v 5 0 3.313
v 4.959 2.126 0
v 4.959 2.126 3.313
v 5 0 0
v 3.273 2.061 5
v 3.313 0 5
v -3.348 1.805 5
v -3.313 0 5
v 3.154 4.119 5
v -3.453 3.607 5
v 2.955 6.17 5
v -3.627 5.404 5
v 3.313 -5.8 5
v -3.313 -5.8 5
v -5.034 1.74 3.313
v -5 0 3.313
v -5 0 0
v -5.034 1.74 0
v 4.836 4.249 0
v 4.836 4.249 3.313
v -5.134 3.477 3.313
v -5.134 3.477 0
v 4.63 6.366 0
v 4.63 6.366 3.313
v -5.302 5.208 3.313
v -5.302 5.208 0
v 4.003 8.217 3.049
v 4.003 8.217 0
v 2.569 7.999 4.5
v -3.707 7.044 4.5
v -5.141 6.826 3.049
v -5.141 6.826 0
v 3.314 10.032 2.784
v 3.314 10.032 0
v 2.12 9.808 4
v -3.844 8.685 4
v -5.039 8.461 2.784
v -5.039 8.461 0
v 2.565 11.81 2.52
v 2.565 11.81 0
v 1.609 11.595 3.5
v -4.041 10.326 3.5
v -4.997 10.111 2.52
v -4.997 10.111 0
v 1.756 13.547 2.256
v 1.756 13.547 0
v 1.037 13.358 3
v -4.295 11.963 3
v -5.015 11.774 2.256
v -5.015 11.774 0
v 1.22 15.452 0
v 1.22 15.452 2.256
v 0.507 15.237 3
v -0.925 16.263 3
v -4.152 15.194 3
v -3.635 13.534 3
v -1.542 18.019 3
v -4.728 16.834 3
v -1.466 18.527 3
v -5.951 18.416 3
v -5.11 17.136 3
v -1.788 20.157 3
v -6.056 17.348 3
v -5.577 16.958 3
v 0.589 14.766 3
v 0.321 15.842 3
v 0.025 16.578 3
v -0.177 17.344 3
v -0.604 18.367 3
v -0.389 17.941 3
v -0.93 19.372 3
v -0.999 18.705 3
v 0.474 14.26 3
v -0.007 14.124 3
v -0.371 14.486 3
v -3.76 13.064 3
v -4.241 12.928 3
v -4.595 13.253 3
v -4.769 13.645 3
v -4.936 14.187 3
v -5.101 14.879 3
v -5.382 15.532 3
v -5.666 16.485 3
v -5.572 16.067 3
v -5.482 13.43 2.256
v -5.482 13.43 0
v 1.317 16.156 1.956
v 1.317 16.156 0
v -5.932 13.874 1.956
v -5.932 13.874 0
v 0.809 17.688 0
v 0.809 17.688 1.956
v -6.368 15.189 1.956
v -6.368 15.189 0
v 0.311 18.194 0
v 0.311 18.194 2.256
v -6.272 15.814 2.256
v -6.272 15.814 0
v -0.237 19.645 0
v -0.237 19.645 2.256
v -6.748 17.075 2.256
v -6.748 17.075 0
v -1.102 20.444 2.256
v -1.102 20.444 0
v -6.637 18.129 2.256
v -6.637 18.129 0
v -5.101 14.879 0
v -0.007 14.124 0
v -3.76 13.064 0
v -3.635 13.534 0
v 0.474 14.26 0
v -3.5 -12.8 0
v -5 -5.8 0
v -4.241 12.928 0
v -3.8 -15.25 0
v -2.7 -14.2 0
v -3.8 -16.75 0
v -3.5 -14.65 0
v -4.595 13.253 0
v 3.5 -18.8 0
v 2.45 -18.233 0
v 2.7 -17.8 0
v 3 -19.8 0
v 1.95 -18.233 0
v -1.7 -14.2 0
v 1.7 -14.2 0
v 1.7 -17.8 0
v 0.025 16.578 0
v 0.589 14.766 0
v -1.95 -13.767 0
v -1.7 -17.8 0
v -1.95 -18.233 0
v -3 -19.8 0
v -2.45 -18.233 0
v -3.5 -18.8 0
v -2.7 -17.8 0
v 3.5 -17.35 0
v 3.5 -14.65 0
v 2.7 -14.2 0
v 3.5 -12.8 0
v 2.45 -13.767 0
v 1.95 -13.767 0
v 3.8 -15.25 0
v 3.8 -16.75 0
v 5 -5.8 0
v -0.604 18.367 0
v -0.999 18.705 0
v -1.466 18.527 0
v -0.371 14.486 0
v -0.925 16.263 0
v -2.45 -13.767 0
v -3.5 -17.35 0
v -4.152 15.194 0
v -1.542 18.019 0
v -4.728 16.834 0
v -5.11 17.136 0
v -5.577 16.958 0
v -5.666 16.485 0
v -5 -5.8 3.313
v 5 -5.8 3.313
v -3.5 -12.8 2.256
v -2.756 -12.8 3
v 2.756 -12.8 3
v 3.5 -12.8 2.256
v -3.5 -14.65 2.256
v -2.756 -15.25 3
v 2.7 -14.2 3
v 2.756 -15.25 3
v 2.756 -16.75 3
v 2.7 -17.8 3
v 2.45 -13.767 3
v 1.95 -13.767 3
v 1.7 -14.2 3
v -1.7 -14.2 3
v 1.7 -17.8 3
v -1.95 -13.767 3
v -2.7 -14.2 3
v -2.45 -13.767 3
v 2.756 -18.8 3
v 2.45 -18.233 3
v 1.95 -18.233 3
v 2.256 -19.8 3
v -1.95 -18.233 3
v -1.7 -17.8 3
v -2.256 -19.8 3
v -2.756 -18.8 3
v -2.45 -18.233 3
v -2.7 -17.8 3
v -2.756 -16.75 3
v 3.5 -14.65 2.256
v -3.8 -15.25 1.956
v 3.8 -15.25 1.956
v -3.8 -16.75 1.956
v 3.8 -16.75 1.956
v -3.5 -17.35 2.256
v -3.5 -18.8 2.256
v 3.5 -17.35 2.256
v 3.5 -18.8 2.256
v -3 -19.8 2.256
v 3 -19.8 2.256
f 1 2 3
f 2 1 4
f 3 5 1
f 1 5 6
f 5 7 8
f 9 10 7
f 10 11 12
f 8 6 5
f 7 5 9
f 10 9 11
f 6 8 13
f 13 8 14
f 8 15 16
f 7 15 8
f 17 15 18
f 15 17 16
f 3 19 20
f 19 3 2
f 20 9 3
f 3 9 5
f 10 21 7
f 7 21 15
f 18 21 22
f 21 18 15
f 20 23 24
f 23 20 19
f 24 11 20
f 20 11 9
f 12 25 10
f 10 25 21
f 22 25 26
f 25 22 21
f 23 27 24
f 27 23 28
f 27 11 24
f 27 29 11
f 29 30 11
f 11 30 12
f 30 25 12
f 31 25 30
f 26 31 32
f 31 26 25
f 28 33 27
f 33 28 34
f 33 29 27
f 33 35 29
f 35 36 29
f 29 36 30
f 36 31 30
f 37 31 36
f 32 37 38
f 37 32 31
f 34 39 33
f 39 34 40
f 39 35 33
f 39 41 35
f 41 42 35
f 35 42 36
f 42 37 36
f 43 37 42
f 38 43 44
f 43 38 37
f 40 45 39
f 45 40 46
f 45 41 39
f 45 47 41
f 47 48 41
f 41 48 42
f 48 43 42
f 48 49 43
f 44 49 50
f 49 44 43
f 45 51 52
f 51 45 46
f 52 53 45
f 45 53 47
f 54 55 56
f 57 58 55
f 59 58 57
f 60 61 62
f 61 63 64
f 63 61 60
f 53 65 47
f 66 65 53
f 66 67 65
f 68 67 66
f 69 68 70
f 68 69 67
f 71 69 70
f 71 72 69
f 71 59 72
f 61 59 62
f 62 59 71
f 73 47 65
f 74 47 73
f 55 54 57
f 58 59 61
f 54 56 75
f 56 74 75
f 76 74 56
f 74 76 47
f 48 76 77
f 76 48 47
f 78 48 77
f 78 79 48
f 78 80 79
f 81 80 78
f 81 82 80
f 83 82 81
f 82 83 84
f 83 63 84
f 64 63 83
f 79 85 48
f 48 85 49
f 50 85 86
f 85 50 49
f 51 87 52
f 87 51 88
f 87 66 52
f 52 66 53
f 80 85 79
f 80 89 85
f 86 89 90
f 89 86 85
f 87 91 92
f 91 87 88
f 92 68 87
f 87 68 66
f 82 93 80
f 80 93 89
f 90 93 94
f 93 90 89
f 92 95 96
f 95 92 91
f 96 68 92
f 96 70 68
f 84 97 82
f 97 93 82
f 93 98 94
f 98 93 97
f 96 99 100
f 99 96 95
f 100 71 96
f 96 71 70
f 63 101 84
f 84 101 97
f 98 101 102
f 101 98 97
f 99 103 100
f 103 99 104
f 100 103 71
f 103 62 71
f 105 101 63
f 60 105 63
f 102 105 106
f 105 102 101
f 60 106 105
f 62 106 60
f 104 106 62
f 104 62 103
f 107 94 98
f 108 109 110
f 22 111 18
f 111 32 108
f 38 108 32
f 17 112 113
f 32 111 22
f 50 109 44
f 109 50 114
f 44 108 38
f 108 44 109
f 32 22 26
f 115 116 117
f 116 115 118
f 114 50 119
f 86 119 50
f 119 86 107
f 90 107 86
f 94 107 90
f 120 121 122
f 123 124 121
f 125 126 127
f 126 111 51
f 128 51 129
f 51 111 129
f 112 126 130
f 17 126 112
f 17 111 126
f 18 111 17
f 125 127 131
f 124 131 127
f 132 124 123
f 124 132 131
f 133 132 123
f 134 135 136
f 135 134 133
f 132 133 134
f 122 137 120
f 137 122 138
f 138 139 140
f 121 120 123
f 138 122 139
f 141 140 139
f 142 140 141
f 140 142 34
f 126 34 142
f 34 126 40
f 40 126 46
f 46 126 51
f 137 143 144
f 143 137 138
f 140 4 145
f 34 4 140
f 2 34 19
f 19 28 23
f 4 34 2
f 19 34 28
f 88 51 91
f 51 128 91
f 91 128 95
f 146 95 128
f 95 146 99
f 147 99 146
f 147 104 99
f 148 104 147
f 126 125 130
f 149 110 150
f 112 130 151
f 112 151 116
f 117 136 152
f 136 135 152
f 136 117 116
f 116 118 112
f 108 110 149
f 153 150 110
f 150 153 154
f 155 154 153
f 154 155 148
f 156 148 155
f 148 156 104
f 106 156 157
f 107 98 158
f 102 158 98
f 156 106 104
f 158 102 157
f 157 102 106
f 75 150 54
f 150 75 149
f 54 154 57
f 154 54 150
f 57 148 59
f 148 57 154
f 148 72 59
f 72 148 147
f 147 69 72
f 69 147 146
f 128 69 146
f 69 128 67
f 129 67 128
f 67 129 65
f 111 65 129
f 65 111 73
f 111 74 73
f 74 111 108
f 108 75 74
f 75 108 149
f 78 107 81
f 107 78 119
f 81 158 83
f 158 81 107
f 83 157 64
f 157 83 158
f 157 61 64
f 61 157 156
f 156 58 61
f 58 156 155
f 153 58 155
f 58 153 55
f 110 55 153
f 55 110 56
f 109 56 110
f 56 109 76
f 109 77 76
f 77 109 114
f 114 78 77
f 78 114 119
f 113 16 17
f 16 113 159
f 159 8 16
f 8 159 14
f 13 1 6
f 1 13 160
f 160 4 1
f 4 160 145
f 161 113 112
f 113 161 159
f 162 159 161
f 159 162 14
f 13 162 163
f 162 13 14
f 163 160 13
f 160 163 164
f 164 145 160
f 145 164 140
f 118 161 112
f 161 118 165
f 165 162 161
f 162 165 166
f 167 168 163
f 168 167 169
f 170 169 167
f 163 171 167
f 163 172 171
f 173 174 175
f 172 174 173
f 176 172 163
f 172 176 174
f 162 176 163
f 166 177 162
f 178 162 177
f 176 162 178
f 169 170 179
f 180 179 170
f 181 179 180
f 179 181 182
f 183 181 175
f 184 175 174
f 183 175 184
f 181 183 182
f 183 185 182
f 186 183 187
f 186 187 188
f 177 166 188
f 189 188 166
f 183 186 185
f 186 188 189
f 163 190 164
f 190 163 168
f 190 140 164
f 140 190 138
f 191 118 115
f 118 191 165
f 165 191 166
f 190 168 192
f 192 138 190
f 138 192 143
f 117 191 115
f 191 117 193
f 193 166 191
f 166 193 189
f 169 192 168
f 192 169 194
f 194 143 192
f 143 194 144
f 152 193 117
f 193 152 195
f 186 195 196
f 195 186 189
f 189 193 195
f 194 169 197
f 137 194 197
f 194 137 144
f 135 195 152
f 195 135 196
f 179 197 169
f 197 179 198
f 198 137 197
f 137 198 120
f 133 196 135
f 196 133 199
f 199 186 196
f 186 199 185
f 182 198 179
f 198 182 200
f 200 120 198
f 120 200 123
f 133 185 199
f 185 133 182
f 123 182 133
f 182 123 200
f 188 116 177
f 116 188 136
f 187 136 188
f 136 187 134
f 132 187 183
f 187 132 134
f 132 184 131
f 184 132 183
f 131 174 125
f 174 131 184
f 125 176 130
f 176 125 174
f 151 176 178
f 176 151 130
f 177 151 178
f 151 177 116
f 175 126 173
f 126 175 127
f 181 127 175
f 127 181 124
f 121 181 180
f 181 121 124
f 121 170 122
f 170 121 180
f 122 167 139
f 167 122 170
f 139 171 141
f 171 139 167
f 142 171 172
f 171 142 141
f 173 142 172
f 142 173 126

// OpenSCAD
X = 0;
Y = 1;
Z = 2;

//TODO reenforcment
mortise_config = mortise_config(r=undef);

%render()difference() {
    translate([-9.5, 0.1, -1])cube([17, 22, 8]);
    MortiseAndTenon("mortise", mortise_config(mortise_config, r=50));
}

render() union() {
    MortiseAndTenon("tenon", mortise_config(mortise_config, r=50));
    mirror([0,1,0])MortiseAndTenon("tenon", mortise_config);
}

function is_def(v) = !is_undef(v);
function config_value(index, config1, config2, value) = (
    (is_def(value)) ? (
        value
    ) : (is_def(config1[index])) ? (
        config1[index]
    ) : (
        config2[index]
    )
);


function mortise_config(
    config1, config2,
    tolerance_lenght, length, width_1, width_2, thickness_1, thickness_2, notch, tight_length, bevel, r,
    tolerance_side, tolerance_bottom, tolerance_top, tolerance_bevel
) = [
    config_value( 0, config1, config2, tolerance_lenght),    
    config_value( 1, config1, config2, length),
    config_value( 2, config1, config2, width_1),
    config_value( 3, config1, config2, width_2),
    config_value( 4, config1, config2, thickness_1),
    config_value( 5, config1, config2, thickness_2),
    config_value( 6, config1, config2, notch),
    config_value( 7, config1, config2, tight_length),
    config_value( 8, config1, config2, bevel),
    config_value( 9, config1, config2, r),
    config_value(10, config1, config2, tolerance_side),
    config_value(11, config1, config2, tolerance_bottom),
    config_value(12, config1, config2, tolerance_top),
    config_value(13, config1, config2, tolerance_bevel)
];
default_mortise_config = mortise_config(
    tolerance_lenght =   0.2,    
    length =            20.0,
    width_1 =           10.0,
    width_2 =            7.0,
    thickness_1 =        6.0,
    thickness_2 =        4.0,
    notch =             [1.5, 0.2],
    tight_length =       6.0,
    bevel =              1.0,
    r =                  undef,
    tolerance_side =    -0.0,
    tolerance_bottom =   0.0,
    tolerance_top =      1.0,
    tolerance_bevel =   -0.1
);
echo(mortise_config(default_mortise_config, r = 10));

module MortiseAndTenon(
    part   = "mortise",
    config = mortise_config()
) {
    assert(part == "mortise" || part == "tenon", "'part' must be either \"mortise\" or \"tenon\"");

    effective_config = mortise_config(config1 = config, config2 = default_mortise_config);
    function get_config(index, allow_undef=false) = (
        let(v = effective_config[index])
        assert(allow_undef || !is_undef(v), str("config with index ", index, " not defined"))
        v
    );
    z_tolerance  = part == "tenon" ? -get_config(0) : 0;
    length       = get_config(1);
    width_1      = get_config(2);
    width_2      = get_config(3);
    thickness_1  = get_config(4);
    thickness_2  = get_config(5);
    notch        = get_config(6);
    tight_length = get_config(7);
    bevel        = get_config(8);
    r            = get_config(9, allow_undef = true);
    tolerance_side   = get_config(10);
    tolerance_bottom = get_config(11);
    tolerance_top    = get_config(12);
    tolerance_bevel  = get_config(13);
    
    r_error = width_1 / ($preview ? 100 : 1000);
    mortise_offsets = offsets(
        side   = 0,
        bottom = 0,
        top    = 0,
        bevel  = 0 
    );
    tenon_offsets = offsets(
        side   = -tolerance_side,
        bottom = -tolerance_bottom,
        top    = -tolerance_top,
        bevel  = -tolerance_bevel
    );

    points = mortise_points(
        z_tolerance  = z_tolerance,
        length       = length,
        width_1      = width_1,
        width_2      = width_2,
        thickness_1  = thickness_1,
        thickness_2  = thickness_2,
        notch        = [notch[0], notch[1] * ((part == "tenon") ? 1.5 : 1)],
        tight_length = tight_length,
        bevel        = bevel,
        offsets      = part == "mortise" ? mortise_offsets : tenon_offsets,
        r            = r,
        r_error      = r_error
    );
    rotate(180) rotate(90, [1,0,0]) render() difference() {
        polyhedron(points = points, faces = faces(points));
        if(part == "tenon") SlideSlots();
    }
    module SlideSlots() {
        rotate(90, [1,0,0]) {
            linear_extrude(12, center = true) {
                SlideSlot_2d(offset_x =  width_2 / 2 - (1 / 2) - (2 * 0.4));
                SlideSlot_2d(offset_x = -width_2 / 2 + (1 / 2) + (2 * 0.4));
            }
        }
        module SlideSlot_2d(
            offset_x
        ) {
            polygon(slide_slot_points(
                length = tight_length * 3/5,,
                width  = 1,
                r_error = 0.1,
                offset = [
                    length - bevel - tight_length / 2,
                    offset_x
                ],
                r = r
            ));
        }
    }

    //
    function offsets(
        side   = 0.1,
        bottom = 0.05,
        top    = 1.0,
        bevel  = 0.15
    ) = [
        side,
        bottom,
        top,
        bevel 
    ];
    function mortise_points(
        z_tolerance, length, width_1, width_2, thickness_1, thickness_2, notch, tight_length, bevel, offsets, r, r_error
    ) = let(
        fs = (
            is_undef(r) ? undef : (
                assert(
                    !is_undef(r_error),
                    "If 'r' is defined, you must define 'r_error' too"
                ) let(
                    r_max = r + max(width_1, width_2) / 2
                ) size_of_facet(r, r_error)
            )
        ),
        q = length - bevel - tight_length / 2,
        z_width_and_offset_sides = concat(
            [
                [0,                                           width_1,         0,        thickness_1],
                [z_tolerance + tight_length,                  width_1,         0,        thickness_1],
                [z_tolerance + length - bevel - tight_length, width_2,         0,        thickness_2]
            ], is_undef(notch) ? [] : [
                [q - notch[0] / 2 - 2 * notch[1],             width_2,         0,        thickness_2],
                [q - notch[0] / 2,                            width_2,         notch[1], thickness_2],
                [q + notch[0] / 2,                            width_2,         notch[1], thickness_2],
                [q + notch[0] / 2 + 2 * notch[1],             width_2,         0,        thickness_2]
            ], [
                [z_tolerance + length - bevel,                width_2,         0,        thickness_2],
                [z_tolerance + length,                        width_2 - bevel, 0,        thickness_2]
            ]
        )
    ) bend_points_3d(
        r = r,
        points = [
            each for (i = [0 : len(z_width_and_offset_sides) - 2]) (
                section_points_3d(
                    z_from           = z_width_and_offset_sides[i    ][0],
                    z_to             = z_width_and_offset_sides[i + 1][0], 
                    width_from       = z_width_and_offset_sides[i    ][1],
                    width_to         = z_width_and_offset_sides[i + 1][1],
                    offset_side_from = z_width_and_offset_sides[i    ][2],
                    offset_side_to   = z_width_and_offset_sides[i + 1][2],
                    thickness_from   = z_width_and_offset_sides[i    ][3],
                    thickness_to     = z_width_and_offset_sides[i + 1][3],
                    offsets          = offsets,
                    fs = fs,
                    skip_first_ring = (i!=0))
            )
        ]
    );

    // Calculate the 3d points of a section
    function section_points_3d(
        z_from, z_to, width_from, width_to, offset_side_from, offset_side_to, thickness_from, thickness_to, offsets, fs, skip_first_ring
    ) = (let(
            steps = is_undef(fs) ? 1 : ceil(max(1, abs(z_from - z_to) / fs))
        ) [
            each for (step = [(skip_first_ring?1:0):steps]) (
                let(
                    f           = steps > 0 ? step / steps : 0,
                    z           = z_from           * (1 - f) + z_to           * f,
                    width       = width_from       * (1 - f) + width_to       * f,
                    offset_side = offset_side_from * (1 - f) + offset_side_to * f,
                    thickness   = thickness_from   * (1 - f) + thickness_to   * f,
                    ps    = profile_points_2d(
                        width       = width,
                        thickness   = thickness,
                        offset_side = offset_side,
                        offsets     = offsets
                    )
                )
                [for (i = [0:len(ps)-1]) [
                    ps[i][X],
                    ps[i][Y],
                    z
                ]]
            )
        ]
    );

    // Calculate the 2D points of the profile
    function profile_points_2d(width, thickness, offset_side, offsets) = (
        let(
            thickness     = thickness,
            bevel         = thickness / 3,//settings[1],
            bevel_angle   = 45,
            offset_side2  = offsets[0] + offset_side,
            offset_bottom = offsets[1],
            offset_top    = offsets[2],
            offset_bevel  = offsets[3],
            a = width / 2 ,
            b = a - (bevel - offset_bevel) / cos(bevel_angle) - offset_top * tan(bevel_angle),
            c = thickness,
            d = c - (bevel - offset_bevel) / sin(bevel_angle) - offset_side2 / tan(bevel_angle)
        )[
            [ a + offset_side2, 0 - offset_bottom],
            [ a + offset_side2,  d],
            [ b,  c + offset_top],
            [-b,  c + offset_top],
            [-a - offset_side2,  d],
            [-a - offset_side2,  0 - offset_bottom]
        ]
    );
    
    // Calculate the faces for the polygon
    function faces(points) = concat(
        [[0,1,2,3,4,5]],
        [each for (i = [0 : 6 : len(points) - 7])[
            [i + 0, i +  6, i +  7, i + 1],
            [i + 1, i +  7, i +  8, i + 2],
            [i + 2, i +  8, i +  9, i + 3],
            [i + 3, i +  9, i + 10, i + 4],
            [i + 4, i + 10, i + 11, i + 5],
        ]],
        [[for (i = [len(points)-1:-1:len(points)-6]) i]],
        [concat(
            [for (i = [len(points)-6:-6:0]) i],
            [for (i = [5:6:len(points)-1]) i]
        )]
    );
}

// Bending the 3D points
function bend_points_3d(r = undef, points) = (
    is_undef(r) ? (
        points
    ) : [
        for (p = points) [
            r - cos(p[Z] / r * (180 / PI)) * (p[X] + r),
            p[Y],
            sin(p[Z] / r * (180 / PI)) * (p[X] + r)
        ]
    ]
);
function bend_points_2d(r = undef, points) = (
    is_undef(r) ? (
        points
    ) : [
        for (p = points) [
            r - cos(p[Y] / r * (180 / PI)) * (p[X] + r),
            sin(p[Y] / r * (180 / PI)) * (p[X] + r)
        ]
    ]
);

// Calculate points of lines and shapes
function slide_slot_points(
    length,
    width,
    r_error,
    offset = [0, 0], // In rotated field
    r = undef
) = bend_points_2d(
    r = r,
    points = (
        let(
            line_steps = is_undef(r) ? (
                2
            ) : (
                ceil(length / size_of_facet(r = r, r_error = r_error)) + 1
            )
        ) concat(
            arc_points(r = width / 2, a_from = 180, a_to = 360, offset = [offset[Y], -length / 2 + offset[X]], r_error = r_error),
            line_points(from = [width / 2 + offset[Y], -length / 2 + offset[X]], to = [width / 2 + offset[Y], length / 2 + offset[X]], steps = line_steps, skip_first = true, skip_last = true),
            arc_points(r = width / 2, a_from =   0, a_to = 180, offset = [offset[Y],  length / 2 + offset[X]], r_error = r_error),
            line_points(from = [-width / 2 + offset[Y], length / 2 + offset[X]], to = [-width / 2 + offset[Y], -length / 2 + offset[X]], steps = line_steps, skip_first = true, skip_last = true)
        )
    )
);

function arc_points(
    r,
    a_from,
    a_to,
    r_error,
    offset = [0,0],
    skip_first = false,
    skip_last  = false
) = let(
    fn    = number_of_facet(r = r, r_error = r_error),
    steps = ceil(abs(a_to - a_from) / fn)
) [ for(i = [(skip_first?1:0):(steps-(skip_last?1:0))]) (
    let(
        f = i / steps,
        a = a_to * f + a_from * (1 - f)
    ) [
        cos(a) * r + offset[X],
        sin(a) * r + offset[Y]
    ]
)];

function line_points(
    from,
    to,
    steps      = 2,
    skip_first = false,
    skip_last  = false
) = let (
) [ for(i = [(skip_first?1:0):(steps-(skip_last?1:0))]) (
    let(
        f = i / steps
    ) to * f + from * (1 - f)
)];

// Calculate facets of a circle    
function number_of_facet(r, r_error) = 2 * acos(1 - r_error/r);
function size_of_facet(r, r_error) = number_of_facet(r, r_error) * PI * r / 180;
